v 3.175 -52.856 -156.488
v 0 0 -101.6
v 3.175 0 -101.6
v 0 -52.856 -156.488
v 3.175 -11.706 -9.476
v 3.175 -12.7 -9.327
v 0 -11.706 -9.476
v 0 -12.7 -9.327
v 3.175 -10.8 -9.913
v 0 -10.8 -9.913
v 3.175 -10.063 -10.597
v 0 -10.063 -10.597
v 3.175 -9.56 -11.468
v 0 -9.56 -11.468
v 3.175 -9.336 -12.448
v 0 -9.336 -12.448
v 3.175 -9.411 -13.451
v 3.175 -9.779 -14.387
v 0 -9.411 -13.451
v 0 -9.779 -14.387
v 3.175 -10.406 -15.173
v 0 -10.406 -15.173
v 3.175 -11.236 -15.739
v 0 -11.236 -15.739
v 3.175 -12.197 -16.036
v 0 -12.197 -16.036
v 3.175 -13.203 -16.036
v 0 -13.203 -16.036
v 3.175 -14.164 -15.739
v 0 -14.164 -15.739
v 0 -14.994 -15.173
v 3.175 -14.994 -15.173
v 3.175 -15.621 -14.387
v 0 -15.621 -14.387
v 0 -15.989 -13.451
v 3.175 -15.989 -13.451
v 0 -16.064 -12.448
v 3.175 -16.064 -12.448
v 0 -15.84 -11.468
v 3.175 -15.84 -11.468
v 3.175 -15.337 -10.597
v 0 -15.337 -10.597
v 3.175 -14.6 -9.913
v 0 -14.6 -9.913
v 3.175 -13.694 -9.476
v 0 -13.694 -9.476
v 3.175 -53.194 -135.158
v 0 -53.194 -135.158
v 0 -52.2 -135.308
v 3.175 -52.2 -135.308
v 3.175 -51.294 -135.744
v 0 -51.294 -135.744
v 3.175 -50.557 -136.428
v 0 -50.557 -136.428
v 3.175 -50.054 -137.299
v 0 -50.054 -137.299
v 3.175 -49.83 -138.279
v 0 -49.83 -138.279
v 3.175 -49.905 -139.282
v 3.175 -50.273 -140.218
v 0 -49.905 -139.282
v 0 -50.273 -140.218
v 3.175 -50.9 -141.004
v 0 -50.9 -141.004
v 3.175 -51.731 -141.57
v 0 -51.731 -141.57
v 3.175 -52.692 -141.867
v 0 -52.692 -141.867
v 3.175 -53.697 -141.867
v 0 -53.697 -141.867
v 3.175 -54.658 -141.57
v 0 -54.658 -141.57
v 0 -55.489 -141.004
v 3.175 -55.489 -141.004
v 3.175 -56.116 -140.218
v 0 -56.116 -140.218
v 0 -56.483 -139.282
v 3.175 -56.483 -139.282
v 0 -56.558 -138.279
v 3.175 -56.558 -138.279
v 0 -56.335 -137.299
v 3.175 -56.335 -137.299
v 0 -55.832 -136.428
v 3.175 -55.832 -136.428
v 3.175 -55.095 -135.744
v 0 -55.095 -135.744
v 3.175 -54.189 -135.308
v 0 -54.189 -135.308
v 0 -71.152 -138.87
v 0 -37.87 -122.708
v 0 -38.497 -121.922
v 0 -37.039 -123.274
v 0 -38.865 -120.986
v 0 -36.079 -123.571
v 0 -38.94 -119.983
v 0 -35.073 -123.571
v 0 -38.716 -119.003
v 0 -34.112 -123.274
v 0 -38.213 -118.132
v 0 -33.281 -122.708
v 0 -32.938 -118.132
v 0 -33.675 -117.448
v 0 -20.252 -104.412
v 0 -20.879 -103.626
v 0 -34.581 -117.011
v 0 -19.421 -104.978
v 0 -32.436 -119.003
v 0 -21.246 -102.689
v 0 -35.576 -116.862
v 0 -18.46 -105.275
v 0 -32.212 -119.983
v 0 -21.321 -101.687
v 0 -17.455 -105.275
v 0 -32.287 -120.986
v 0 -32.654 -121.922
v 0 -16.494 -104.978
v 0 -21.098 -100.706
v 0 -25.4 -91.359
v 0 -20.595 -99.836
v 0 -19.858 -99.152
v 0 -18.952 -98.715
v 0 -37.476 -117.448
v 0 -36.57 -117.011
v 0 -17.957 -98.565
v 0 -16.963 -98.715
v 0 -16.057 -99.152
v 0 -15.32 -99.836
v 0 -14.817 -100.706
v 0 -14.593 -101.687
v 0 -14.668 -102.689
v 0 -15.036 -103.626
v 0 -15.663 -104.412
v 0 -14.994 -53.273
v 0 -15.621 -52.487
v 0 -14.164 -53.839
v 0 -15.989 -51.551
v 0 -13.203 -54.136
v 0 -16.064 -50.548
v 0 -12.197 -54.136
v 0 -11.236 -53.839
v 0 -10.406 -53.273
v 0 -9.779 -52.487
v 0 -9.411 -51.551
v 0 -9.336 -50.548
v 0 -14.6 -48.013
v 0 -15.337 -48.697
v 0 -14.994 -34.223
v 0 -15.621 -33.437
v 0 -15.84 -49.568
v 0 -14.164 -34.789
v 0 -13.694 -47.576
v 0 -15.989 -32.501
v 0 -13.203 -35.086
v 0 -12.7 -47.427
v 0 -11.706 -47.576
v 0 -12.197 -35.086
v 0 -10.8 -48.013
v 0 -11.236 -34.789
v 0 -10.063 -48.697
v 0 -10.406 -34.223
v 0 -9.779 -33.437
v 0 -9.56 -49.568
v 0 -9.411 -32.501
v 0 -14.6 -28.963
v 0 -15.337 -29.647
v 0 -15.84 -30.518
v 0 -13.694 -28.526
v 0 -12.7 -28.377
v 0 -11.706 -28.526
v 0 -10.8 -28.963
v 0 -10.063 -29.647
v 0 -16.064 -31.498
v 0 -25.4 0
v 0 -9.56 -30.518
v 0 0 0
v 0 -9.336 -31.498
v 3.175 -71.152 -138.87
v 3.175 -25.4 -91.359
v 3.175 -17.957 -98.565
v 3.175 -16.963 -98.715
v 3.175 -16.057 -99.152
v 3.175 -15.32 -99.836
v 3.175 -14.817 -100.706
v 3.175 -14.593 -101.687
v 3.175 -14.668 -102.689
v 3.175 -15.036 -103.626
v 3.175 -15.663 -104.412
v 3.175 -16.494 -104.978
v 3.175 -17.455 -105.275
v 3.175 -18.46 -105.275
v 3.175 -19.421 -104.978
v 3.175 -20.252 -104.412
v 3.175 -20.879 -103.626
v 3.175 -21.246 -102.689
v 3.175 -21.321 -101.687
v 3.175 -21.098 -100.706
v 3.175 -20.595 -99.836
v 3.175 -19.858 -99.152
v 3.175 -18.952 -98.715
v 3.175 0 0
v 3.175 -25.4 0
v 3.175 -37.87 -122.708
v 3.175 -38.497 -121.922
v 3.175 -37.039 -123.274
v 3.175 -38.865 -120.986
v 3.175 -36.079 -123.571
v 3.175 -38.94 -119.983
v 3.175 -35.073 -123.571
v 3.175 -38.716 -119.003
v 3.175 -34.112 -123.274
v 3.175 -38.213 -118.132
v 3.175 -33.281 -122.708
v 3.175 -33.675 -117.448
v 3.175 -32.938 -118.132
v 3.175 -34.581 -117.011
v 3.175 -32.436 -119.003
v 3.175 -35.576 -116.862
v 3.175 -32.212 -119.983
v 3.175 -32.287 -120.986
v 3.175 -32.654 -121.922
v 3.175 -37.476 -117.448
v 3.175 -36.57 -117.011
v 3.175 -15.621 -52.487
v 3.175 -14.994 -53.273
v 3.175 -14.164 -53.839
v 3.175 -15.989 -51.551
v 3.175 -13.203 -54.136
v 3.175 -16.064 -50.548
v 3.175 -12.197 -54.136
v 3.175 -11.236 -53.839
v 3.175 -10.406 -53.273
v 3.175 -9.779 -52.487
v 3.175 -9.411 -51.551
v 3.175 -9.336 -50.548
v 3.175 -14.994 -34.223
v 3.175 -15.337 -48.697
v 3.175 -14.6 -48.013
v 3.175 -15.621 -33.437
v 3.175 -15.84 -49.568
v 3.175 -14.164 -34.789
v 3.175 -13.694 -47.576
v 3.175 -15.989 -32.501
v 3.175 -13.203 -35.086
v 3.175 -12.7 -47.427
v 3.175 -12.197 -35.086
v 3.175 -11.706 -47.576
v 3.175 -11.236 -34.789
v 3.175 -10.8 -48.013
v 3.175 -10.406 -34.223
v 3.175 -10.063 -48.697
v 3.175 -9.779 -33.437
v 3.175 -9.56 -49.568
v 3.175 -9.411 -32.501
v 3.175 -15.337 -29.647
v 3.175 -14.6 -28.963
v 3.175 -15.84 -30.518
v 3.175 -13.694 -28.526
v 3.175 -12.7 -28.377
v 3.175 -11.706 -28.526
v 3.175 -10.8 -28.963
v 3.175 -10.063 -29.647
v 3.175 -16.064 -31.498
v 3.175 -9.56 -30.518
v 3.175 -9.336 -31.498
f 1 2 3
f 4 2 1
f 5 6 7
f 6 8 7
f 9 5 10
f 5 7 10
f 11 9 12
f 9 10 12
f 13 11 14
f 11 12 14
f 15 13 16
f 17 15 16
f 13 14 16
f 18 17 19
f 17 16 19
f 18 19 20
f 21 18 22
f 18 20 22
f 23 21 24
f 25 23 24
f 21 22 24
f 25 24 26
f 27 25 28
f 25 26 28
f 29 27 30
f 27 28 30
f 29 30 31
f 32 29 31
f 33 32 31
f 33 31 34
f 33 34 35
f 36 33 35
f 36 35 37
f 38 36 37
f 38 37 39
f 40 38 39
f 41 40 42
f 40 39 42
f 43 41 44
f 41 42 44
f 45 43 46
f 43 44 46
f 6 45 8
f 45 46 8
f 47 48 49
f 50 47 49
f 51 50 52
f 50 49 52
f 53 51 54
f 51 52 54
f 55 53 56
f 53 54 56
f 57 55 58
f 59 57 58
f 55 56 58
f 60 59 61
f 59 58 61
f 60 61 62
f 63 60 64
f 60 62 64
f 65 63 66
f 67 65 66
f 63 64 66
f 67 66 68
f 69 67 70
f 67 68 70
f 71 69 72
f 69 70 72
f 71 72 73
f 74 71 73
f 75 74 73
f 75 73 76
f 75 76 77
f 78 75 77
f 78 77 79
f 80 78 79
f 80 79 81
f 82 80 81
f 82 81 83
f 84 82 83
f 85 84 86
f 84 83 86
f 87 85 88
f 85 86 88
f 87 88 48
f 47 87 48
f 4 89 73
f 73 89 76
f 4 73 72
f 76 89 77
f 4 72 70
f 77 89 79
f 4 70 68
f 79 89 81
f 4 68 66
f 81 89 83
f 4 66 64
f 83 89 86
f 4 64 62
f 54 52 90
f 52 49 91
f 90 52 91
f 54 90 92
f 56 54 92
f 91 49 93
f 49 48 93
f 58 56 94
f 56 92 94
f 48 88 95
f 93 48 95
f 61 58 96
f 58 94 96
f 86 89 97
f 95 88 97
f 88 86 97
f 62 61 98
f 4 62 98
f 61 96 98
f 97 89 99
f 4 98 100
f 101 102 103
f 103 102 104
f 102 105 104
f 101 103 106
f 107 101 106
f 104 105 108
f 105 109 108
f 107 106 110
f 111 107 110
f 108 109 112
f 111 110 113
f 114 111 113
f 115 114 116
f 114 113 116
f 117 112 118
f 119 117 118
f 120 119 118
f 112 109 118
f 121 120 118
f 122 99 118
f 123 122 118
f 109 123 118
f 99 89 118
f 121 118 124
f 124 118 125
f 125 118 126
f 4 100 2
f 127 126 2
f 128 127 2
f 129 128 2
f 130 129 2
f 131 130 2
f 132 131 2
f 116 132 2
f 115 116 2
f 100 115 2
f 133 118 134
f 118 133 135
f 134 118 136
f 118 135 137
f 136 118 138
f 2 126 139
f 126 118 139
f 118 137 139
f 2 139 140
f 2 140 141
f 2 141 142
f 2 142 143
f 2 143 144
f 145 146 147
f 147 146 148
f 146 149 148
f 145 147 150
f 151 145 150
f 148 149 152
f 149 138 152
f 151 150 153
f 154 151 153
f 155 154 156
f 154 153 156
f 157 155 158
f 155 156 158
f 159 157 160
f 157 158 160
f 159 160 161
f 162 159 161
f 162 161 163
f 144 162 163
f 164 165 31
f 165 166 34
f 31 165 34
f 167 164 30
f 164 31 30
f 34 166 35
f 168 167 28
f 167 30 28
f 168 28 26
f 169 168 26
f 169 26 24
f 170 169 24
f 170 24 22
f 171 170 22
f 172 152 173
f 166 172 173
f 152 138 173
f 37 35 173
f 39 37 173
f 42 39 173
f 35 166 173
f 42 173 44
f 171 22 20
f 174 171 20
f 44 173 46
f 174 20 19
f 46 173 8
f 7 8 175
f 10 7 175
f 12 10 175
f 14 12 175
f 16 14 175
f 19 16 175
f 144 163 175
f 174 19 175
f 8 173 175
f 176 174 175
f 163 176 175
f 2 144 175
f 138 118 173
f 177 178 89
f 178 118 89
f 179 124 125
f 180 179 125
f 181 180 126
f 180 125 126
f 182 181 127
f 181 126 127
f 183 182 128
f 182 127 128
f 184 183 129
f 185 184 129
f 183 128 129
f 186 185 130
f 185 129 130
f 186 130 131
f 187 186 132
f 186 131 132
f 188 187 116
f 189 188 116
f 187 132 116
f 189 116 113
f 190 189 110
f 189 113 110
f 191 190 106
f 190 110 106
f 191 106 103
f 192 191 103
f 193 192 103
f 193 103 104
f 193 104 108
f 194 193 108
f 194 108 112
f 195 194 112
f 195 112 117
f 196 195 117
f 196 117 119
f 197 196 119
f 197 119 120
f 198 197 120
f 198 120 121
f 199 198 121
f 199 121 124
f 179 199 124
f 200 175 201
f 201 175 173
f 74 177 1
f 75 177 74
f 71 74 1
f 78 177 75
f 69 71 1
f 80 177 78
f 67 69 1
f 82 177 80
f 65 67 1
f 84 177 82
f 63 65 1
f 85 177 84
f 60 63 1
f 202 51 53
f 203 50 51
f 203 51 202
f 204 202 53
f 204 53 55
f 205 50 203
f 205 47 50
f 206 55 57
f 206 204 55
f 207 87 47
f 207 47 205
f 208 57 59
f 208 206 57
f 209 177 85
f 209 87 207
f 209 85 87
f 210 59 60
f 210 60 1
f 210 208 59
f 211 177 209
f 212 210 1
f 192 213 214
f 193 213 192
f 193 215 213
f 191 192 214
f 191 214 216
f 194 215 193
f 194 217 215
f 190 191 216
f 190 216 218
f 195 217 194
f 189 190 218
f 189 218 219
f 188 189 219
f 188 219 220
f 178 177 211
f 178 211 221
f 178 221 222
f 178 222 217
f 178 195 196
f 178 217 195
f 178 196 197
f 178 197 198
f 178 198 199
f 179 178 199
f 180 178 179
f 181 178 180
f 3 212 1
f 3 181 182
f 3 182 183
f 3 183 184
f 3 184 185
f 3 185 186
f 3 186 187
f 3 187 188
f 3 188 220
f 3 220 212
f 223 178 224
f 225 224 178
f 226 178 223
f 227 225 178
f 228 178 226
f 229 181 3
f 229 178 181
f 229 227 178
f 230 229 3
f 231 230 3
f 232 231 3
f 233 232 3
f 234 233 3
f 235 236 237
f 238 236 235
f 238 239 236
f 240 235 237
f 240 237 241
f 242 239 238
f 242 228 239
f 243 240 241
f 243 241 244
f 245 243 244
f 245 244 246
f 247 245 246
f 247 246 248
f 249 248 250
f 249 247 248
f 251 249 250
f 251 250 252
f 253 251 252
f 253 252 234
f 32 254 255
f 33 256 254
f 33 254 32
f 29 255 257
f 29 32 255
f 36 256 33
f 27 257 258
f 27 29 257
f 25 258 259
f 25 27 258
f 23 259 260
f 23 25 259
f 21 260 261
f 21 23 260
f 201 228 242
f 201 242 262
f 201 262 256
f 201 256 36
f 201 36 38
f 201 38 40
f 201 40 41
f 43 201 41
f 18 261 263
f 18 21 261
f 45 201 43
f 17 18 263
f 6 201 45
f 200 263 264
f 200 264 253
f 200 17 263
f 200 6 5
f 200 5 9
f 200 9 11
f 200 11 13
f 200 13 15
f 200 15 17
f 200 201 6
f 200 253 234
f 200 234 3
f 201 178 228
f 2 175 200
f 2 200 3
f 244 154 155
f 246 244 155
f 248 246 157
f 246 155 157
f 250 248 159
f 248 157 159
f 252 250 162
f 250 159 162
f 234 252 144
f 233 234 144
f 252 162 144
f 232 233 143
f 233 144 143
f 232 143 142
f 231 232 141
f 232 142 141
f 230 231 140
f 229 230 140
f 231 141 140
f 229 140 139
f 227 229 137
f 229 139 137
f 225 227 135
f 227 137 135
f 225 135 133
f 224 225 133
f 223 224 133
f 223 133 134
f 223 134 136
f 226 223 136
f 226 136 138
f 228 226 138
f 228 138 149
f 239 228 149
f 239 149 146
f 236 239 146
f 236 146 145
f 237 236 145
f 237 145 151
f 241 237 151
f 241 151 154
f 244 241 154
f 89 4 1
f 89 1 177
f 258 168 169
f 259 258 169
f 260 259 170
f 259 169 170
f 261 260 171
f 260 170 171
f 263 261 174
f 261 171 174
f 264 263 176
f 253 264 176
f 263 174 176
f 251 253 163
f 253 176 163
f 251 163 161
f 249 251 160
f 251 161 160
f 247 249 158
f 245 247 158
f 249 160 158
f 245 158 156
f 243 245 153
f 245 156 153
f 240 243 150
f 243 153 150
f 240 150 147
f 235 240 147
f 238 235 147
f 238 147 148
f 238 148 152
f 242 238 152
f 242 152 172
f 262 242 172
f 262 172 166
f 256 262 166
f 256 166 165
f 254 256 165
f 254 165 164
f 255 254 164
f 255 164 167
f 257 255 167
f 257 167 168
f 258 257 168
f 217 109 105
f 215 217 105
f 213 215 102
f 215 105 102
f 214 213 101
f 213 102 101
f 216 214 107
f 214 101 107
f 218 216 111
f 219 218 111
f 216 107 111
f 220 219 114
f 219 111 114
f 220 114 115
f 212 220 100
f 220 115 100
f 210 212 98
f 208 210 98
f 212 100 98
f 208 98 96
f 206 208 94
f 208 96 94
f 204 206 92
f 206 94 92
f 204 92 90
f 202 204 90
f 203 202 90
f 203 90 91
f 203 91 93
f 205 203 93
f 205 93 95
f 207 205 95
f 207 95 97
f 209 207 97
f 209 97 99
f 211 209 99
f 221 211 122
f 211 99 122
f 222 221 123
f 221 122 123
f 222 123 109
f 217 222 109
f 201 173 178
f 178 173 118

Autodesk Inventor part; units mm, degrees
ref_plane "YZ Plane" through (0, 0, 0) normal (1, 0, 0) x (0, 1, 0)
ref_plane "XZ Plane" through (0, 0, 0) normal (0, 1, 0) x (-1, 0, 0)
ref_plane "XY Plane" through (0, 0, 0) normal (0, 0, 1) x (1, 0, 0)
sketch "Sketch1" plane through (0, 0, 0) normal (1, 0, 0) x (0, 1, 0)
  line L0 (0, 0) -> (0, -101.6)
  line L1 (0, -101.6) -> (-52.8555, -156.4884)
  line L2 (-25.4, 2.4125) -> (-25.4, -91.3586)
  line L3 (-25.4, -91.3586) -> (-71.1516, -138.8699)
  line L4 (-52.8555, -156.4884) -> (-71.1516, -138.8699)
  line L5 (0, 0) -> (-25.4, 0)
  dimension "d0" = 101.6
  dimension "d1" = 25.4
  dimension "d2" = 25.4
  dimension "d3" = 76.2
  dimension "d4" = 136.081
extrude "Extrusion1" add sketch "Sketch1" along normal blind 3.175
sketch "Sketch2" plane through (0, 0, 0) normal (-1, 0, 0) x (0, 0, 1)
  circle A0 centre (-12.7, -12.7) radius 3.3734
  circle A1 centre (-31.75, -12.7) radius 3.3734
  circle A2 centre (-50.8, -12.7) radius 3.3734
  line L0 (0, -25.4) -> (0, 0) projected
  line L1 (0, -12.7) -> (-114.7885, -12.7) construction
  line L2 (-156.4884, -52.8555) -> (-101.6, 0) projected
  circle A3 centre (-138.5311, -53.1943) radius 3.3734
  circle A4 centre (-120.235, -35.5758) radius 3.3734
  circle A5 centre (-101.9388, -17.9573) radius 3.3734
  line L3 (-91.3586, -25.4) -> (-138.8699, -71.1516) projected
  line L4 (-156.4884, -52.8555) -> (-138.8699, -71.1516) projected
  dimension "d7" = 6.7469
  dimension "d8" = 6.7469
  dimension "d9" = 6.7469
  dimension "d10" = 12.7
  dimension "d11" = 19.05
  dimension "d12" = 19.05
  dimension "d15" = 6.7469
  dimension "d16" = 6.7469
  dimension "d17" = 6.7469
  dimension "d18" = 12.7
  dimension "d19" = 12.7
  dimension "d20" = 12.7
  dimension "d21" = 12.7
  dimension "d22" = 38.1
  dimension "d23" = 63.5
extrude "Extrusion2" cut sketch "Sketch2" against normal blind 3.175
properties part number "lower gusset" material "Aluminum 6061"
